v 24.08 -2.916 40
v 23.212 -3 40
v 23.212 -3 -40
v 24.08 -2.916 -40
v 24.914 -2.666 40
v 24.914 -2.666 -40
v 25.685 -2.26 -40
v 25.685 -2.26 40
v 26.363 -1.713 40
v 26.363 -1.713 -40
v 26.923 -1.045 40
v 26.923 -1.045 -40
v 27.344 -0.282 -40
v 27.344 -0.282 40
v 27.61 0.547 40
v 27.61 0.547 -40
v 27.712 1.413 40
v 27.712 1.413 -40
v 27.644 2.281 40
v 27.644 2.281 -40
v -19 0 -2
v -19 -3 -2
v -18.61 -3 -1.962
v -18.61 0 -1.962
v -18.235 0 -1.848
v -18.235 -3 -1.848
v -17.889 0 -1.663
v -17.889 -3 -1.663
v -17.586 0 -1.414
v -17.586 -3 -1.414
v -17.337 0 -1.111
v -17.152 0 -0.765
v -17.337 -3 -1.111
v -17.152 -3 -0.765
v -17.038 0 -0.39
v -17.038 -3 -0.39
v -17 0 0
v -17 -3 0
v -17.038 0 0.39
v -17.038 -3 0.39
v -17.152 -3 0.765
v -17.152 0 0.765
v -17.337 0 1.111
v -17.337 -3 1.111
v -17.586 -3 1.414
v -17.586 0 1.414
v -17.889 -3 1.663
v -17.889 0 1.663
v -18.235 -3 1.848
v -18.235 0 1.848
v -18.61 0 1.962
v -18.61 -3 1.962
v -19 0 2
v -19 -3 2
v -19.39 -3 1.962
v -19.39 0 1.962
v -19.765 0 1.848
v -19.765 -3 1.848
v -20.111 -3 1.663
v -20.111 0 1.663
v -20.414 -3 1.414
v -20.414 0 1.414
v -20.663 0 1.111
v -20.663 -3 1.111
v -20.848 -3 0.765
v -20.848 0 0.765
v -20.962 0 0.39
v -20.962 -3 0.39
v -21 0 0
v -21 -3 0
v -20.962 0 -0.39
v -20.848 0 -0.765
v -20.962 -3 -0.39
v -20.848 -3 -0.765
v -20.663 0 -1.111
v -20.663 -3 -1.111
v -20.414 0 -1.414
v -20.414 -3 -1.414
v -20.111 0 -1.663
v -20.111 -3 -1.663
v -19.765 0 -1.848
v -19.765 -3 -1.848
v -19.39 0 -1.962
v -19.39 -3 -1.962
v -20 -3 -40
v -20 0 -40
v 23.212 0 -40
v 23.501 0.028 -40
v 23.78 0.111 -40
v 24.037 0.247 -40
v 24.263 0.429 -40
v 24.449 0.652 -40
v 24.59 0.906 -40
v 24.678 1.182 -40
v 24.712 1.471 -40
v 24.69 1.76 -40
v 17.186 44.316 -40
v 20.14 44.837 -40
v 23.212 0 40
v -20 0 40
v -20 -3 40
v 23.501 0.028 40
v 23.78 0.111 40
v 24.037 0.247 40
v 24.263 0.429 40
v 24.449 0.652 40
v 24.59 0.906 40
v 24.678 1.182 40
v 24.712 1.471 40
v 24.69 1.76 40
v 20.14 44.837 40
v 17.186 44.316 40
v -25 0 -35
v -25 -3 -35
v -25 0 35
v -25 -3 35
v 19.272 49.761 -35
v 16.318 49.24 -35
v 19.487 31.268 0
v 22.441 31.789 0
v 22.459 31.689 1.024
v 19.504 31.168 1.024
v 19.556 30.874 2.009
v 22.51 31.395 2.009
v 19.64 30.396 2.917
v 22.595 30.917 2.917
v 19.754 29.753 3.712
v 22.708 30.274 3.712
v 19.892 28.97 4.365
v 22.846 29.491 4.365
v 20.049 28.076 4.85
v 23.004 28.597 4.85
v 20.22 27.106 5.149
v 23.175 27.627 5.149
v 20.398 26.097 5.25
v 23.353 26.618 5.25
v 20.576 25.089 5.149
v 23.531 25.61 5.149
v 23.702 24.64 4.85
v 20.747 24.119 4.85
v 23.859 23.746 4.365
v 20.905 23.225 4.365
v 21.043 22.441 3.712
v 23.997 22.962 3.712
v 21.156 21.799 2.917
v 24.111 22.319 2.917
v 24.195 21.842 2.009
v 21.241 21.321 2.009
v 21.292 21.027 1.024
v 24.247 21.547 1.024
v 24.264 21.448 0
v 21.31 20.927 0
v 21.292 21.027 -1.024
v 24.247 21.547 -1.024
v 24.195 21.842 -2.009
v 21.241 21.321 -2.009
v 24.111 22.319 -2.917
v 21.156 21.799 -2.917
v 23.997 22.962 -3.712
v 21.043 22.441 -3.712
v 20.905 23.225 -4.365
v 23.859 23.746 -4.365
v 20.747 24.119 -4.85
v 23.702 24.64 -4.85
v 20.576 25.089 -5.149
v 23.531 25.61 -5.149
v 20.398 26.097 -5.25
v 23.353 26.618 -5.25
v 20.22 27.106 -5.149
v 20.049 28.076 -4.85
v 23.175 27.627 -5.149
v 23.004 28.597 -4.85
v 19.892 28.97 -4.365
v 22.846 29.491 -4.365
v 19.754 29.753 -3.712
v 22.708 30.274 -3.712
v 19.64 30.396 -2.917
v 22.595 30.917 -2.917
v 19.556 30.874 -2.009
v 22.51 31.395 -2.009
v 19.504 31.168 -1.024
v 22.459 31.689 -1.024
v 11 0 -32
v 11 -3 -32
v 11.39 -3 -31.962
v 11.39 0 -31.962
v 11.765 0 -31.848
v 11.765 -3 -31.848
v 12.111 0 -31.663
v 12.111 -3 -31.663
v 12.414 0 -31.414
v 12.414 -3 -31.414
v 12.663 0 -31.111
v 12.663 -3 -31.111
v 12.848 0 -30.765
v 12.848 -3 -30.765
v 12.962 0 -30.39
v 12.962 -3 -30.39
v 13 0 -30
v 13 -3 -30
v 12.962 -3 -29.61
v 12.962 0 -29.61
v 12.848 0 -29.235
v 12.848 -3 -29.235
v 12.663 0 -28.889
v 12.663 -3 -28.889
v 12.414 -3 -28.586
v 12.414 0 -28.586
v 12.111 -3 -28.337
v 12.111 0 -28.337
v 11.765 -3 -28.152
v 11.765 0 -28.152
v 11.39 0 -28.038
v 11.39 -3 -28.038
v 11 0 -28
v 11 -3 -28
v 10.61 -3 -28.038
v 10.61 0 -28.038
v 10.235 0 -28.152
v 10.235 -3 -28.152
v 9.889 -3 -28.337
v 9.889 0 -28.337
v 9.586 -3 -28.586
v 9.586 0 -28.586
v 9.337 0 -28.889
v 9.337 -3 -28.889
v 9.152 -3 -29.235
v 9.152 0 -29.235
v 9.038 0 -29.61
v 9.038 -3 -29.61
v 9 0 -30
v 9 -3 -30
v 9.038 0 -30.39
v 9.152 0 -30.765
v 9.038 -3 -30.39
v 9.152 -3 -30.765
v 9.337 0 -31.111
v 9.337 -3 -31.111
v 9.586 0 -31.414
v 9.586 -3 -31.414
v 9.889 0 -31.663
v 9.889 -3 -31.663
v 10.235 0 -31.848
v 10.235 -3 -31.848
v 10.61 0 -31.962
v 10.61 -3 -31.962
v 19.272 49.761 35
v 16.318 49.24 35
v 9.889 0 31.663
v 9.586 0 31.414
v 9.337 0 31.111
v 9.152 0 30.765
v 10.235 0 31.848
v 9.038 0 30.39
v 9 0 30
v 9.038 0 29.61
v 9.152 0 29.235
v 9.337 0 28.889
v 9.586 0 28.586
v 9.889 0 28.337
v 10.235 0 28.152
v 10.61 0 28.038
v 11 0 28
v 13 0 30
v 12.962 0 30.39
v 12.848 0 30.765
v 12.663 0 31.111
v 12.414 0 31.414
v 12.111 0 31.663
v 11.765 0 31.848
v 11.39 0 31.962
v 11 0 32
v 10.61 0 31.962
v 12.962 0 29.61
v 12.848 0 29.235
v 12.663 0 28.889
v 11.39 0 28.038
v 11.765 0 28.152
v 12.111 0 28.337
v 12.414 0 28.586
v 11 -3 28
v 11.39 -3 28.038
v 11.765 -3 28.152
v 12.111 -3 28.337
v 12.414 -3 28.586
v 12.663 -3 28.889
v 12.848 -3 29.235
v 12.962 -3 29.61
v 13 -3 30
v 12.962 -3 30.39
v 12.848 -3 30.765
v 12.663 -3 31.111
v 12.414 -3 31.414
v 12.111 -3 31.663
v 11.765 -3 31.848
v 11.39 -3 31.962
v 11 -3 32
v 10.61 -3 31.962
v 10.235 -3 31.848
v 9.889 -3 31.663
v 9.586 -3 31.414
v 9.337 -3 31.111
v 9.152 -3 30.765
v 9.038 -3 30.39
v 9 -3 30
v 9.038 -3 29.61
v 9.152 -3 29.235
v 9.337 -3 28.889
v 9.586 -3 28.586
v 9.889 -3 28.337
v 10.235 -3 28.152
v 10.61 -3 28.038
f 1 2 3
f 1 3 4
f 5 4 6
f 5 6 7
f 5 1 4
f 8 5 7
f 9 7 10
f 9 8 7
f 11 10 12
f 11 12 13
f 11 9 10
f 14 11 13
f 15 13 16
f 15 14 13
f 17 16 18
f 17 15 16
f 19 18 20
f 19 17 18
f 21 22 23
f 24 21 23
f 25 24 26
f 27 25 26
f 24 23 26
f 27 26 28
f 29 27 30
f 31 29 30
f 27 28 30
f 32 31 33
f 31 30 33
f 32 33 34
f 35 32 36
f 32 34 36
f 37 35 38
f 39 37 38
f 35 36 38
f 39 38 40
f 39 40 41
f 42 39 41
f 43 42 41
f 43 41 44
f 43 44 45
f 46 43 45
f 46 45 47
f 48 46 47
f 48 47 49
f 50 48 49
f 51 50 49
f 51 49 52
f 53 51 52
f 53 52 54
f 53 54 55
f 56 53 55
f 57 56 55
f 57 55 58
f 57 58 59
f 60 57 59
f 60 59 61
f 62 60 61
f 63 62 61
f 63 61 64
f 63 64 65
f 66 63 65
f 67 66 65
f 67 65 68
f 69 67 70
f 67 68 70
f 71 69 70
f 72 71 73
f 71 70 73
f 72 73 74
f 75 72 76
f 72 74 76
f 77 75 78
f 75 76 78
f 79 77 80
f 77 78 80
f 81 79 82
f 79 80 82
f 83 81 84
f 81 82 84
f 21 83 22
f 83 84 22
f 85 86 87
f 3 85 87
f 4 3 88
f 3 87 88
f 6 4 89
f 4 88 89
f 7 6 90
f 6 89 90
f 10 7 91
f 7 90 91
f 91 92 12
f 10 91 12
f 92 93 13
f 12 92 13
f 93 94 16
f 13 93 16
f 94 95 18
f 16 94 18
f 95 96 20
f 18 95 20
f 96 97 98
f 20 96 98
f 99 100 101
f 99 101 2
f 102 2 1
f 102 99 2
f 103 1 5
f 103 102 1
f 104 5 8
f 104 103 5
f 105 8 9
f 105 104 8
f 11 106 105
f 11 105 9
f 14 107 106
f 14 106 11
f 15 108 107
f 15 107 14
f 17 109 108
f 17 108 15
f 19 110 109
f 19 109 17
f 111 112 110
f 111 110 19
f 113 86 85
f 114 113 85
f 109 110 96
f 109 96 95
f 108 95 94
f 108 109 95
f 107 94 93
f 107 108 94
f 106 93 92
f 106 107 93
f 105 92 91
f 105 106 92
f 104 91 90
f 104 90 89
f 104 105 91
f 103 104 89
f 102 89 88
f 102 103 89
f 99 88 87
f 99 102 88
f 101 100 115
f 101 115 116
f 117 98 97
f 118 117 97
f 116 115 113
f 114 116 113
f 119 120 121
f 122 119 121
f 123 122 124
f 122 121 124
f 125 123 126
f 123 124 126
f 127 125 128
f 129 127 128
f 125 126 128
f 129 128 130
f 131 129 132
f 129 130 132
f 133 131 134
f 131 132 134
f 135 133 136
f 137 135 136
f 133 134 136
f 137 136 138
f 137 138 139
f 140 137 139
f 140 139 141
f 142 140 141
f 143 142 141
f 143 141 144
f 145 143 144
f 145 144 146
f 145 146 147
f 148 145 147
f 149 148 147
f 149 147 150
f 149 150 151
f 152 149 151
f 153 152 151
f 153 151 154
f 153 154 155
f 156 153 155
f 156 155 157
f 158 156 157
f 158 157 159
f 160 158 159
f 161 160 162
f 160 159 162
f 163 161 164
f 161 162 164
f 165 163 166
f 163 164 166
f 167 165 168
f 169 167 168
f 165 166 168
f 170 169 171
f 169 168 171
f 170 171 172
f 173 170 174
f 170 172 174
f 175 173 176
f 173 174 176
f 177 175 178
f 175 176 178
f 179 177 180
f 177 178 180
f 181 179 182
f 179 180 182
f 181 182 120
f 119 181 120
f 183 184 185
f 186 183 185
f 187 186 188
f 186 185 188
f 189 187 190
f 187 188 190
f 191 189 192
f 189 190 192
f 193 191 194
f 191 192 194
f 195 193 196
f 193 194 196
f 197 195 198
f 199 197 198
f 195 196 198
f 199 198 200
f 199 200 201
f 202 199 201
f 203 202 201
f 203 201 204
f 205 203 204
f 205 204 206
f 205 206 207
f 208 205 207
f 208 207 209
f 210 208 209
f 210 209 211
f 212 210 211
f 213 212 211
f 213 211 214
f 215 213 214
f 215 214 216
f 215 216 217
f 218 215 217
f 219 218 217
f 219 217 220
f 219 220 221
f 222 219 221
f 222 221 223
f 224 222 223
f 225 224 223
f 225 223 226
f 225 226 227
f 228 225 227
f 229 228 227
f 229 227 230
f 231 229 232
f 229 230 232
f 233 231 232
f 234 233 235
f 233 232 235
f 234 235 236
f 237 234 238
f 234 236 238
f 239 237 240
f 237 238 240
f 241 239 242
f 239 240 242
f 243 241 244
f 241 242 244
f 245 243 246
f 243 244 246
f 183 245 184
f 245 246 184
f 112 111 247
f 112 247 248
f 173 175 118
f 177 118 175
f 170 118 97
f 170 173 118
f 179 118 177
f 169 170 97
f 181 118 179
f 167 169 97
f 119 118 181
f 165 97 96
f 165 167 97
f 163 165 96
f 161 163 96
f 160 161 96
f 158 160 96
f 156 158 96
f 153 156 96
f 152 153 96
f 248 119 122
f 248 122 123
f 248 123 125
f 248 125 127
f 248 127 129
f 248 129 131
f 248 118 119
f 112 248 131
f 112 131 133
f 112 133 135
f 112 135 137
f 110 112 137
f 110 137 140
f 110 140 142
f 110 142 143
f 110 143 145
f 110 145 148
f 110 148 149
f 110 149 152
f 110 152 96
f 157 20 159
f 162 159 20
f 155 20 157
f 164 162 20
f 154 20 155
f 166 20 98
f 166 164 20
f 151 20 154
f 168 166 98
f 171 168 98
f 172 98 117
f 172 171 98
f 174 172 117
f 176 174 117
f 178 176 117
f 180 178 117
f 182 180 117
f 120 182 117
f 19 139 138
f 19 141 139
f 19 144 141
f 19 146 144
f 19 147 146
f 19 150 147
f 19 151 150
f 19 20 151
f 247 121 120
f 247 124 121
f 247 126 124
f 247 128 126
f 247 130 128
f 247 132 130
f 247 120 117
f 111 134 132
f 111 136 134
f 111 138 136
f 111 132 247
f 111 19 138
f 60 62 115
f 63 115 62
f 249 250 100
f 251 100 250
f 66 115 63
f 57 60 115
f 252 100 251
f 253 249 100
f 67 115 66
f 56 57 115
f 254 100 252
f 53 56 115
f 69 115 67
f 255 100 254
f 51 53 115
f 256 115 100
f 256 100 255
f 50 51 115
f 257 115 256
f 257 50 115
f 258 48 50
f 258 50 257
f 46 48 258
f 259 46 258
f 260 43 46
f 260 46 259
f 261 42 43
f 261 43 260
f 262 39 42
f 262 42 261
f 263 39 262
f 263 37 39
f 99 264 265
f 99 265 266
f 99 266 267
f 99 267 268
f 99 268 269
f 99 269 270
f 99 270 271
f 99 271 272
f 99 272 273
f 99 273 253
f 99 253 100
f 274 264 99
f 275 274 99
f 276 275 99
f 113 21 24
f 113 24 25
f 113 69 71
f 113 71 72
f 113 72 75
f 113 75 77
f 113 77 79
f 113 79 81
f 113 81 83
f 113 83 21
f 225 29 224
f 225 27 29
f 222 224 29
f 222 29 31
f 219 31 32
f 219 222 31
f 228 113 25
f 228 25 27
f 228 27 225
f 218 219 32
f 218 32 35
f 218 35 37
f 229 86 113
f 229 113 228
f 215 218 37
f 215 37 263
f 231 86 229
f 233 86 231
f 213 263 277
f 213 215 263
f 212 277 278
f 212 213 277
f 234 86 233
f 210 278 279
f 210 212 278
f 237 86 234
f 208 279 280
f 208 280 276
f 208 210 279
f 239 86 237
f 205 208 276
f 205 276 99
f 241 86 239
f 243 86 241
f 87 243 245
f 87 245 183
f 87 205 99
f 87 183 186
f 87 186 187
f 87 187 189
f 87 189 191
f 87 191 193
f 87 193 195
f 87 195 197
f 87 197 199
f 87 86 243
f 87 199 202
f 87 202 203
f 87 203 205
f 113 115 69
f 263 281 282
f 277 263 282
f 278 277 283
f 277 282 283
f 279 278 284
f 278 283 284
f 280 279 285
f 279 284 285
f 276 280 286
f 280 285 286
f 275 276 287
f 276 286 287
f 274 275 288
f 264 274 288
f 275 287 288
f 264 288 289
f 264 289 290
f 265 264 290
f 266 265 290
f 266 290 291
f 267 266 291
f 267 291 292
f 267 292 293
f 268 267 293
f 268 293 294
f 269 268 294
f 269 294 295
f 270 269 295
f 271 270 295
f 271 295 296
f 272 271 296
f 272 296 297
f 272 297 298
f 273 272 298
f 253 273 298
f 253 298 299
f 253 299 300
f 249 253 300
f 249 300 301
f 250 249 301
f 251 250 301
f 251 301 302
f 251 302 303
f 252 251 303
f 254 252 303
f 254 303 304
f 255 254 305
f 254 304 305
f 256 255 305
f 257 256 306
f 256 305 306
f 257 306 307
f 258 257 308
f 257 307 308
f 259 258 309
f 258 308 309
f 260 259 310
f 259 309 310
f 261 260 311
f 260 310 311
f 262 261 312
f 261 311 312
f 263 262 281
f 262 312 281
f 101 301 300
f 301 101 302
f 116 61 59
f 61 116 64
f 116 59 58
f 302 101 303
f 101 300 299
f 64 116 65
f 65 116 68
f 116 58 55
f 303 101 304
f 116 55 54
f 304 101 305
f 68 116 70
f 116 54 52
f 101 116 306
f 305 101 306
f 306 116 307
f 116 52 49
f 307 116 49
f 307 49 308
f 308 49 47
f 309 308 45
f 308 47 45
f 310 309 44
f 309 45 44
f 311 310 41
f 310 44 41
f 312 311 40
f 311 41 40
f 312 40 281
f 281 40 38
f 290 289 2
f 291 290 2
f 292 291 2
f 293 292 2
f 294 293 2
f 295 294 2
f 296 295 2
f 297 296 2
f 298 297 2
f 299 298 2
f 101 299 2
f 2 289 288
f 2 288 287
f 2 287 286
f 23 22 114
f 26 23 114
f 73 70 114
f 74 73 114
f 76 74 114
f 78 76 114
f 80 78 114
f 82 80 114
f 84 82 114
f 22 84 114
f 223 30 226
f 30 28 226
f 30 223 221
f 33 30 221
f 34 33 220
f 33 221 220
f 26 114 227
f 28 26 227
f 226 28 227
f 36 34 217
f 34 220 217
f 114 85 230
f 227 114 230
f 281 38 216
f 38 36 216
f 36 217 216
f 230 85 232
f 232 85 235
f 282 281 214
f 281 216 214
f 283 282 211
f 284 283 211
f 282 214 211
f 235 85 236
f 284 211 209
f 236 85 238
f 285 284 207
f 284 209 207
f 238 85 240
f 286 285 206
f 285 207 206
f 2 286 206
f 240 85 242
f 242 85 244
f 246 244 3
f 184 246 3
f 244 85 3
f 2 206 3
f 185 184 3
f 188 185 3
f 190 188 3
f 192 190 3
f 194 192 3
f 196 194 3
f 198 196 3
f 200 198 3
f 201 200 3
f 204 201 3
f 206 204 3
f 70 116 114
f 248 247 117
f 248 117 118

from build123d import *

# Parameters (mm, degrees)
SKETCH1_W                    = 50
SKETCH1_H                    = 80
BASE_FLANGE1_DEPTH           = 3
EDGE_FLANGE1_STRIP_CUT_DEPTH = 80
EDGE_FLANGE1_DEPTH           = 80
CHAMFER1_SIZE                = 5
SKETCH7_R                    = 5.25
CUT_EXTRUDE1_DEPTH           = 10
CUT_EXTRUDE2_REACH           = 73.776
SKETCH8_R                    = 2


# Sheet-metal steps are written as plain solids
with BuildPart() as part:
    # Sketch1 → Base-Flange1 (new body)
    with BuildSketch(Plane(origin=(0, 0, 0), x_dir=(1, 0, 0), z_dir=(0, 1, 0))):
        Rectangle(SKETCH1_W, SKETCH1_H)
    extrude(amount=-BASE_FLANGE1_DEPTH)

    # Edge-Flange1 strip (across the edge) → Edge-Flange1 strip cut (cut)
    with BuildSketch(Plane(origin=(25, 0, 40), x_dir=(-0.9848077530122087, -0.17364817766692717, 0), z_dir=(0, 0, -1))):
        Polygon((-15.323305866, -5.748192093), (2.2814168, -2.6440045), (1.760472267, 0.310418759), (-15.844250399, -2.793768834), align=None)
    extrude(amount=EDGE_FLANGE1_STRIP_CUT_DEPTH, mode=Mode.SUBTRACT)

    # Edge-Flange1 section (across the edge) → Edge-Flange1 (add)
    with BuildSketch(Plane(origin=(25, 0, 40), x_dir=(-0.9848077530122087, -0.17364817766692717, 0), z_dir=(0, 0, -1))):
        with BuildLine():
            Line((-3, 1.787630389), (-3, 50))
            Line((-3, 50), (0, 50))
            Line((0, 50), (0, 1.787630389))
            ThreePointArc((0, 1.787630389), (0.535818585, 0.638563724), (1.760472267, 0.310418759))
            Line((1.760472267, 0.310418759), (2.2814168, -2.6440045))
            ThreePointArc((2.2814168, -2.6440045), (-1.392544244, -1.659569605), (-3, 1.787630389))
        make_face()
    extrude(amount=EDGE_FLANGE1_DEPTH)

    # Chamfer1
    chamfer1_edges = [part.edges().sort_by_distance(p)[0] for p in [
        (17.794802746, 49.500859917, 40),
        (17.794802746, 49.500859917, -40),
        (-25, -1.5, 40),
        (-25, -1.5, -40),
    ]]
    chamfer(chamfer1_edges, length=CHAMFER1_SIZE)

    # Sketch7 → Cut-Extrude1 (cut)
    with BuildSketch(Plane(origin=(27.200581019, 4.796196325, 0), x_dir=(0, 0, -1), z_dir=(0.9848077530122087, 0.1736481776669272, 0))):
        with Locations(Location((0, 22.158795558, 0), (0, 0, 90))):
            Circle(SKETCH7_R)
    extrude(amount=-CUT_EXTRUDE1_DEPTH, mode=Mode.SUBTRACT)

    # Sketch8 → Cut-Extrude2 (cut, up to next)
    with BuildSketch(Plane.XZ.offset(3), mode=Mode.PRIVATE) as cut_extrude2_sk1:
        with Locations(Location((-19, 0, 0), (0, 0, 270))):
            Circle(SKETCH8_R)
    cut_extrude2_tool1 = extrude(cut_extrude2_sk1.sketch, amount=-CUT_EXTRUDE2_REACH, mode=Mode.PRIVATE) & part.part
    # Sketch8 → Cut-Extrude2 (cut, up to next)
    with BuildSketch(Plane.XZ.offset(3), mode=Mode.PRIVATE) as cut_extrude2_sk2:
        with Locations(Location((11, 30, 0), (0, 0, 270))):
            Circle(SKETCH8_R)
    cut_extrude2_tool2 = extrude(cut_extrude2_sk2.sketch, amount=-CUT_EXTRUDE2_REACH, mode=Mode.PRIVATE) & part.part
    # Sketch8 → Cut-Extrude2 (cut, up to next)
    with BuildSketch(Plane.XZ.offset(3), mode=Mode.PRIVATE) as cut_extrude2_sk3:
        with Locations(Location((11, -30, 0), (0, 0, 270))):
            Circle(SKETCH8_R)
    cut_extrude2_tool3 = extrude(cut_extrude2_sk3.sketch, amount=-CUT_EXTRUDE2_REACH, mode=Mode.PRIVATE) & part.part
    add(cut_extrude2_tool1.solids().sort_by_distance((-19, -3, 0))[0], mode=Mode.SUBTRACT)
    add(cut_extrude2_tool2.solids().sort_by_distance((11, -3, 30))[0], mode=Mode.SUBTRACT)
    add(cut_extrude2_tool3.solids().sort_by_distance((11, -3, -30))[0], mode=Mode.SUBTRACT)


solid = part.part
